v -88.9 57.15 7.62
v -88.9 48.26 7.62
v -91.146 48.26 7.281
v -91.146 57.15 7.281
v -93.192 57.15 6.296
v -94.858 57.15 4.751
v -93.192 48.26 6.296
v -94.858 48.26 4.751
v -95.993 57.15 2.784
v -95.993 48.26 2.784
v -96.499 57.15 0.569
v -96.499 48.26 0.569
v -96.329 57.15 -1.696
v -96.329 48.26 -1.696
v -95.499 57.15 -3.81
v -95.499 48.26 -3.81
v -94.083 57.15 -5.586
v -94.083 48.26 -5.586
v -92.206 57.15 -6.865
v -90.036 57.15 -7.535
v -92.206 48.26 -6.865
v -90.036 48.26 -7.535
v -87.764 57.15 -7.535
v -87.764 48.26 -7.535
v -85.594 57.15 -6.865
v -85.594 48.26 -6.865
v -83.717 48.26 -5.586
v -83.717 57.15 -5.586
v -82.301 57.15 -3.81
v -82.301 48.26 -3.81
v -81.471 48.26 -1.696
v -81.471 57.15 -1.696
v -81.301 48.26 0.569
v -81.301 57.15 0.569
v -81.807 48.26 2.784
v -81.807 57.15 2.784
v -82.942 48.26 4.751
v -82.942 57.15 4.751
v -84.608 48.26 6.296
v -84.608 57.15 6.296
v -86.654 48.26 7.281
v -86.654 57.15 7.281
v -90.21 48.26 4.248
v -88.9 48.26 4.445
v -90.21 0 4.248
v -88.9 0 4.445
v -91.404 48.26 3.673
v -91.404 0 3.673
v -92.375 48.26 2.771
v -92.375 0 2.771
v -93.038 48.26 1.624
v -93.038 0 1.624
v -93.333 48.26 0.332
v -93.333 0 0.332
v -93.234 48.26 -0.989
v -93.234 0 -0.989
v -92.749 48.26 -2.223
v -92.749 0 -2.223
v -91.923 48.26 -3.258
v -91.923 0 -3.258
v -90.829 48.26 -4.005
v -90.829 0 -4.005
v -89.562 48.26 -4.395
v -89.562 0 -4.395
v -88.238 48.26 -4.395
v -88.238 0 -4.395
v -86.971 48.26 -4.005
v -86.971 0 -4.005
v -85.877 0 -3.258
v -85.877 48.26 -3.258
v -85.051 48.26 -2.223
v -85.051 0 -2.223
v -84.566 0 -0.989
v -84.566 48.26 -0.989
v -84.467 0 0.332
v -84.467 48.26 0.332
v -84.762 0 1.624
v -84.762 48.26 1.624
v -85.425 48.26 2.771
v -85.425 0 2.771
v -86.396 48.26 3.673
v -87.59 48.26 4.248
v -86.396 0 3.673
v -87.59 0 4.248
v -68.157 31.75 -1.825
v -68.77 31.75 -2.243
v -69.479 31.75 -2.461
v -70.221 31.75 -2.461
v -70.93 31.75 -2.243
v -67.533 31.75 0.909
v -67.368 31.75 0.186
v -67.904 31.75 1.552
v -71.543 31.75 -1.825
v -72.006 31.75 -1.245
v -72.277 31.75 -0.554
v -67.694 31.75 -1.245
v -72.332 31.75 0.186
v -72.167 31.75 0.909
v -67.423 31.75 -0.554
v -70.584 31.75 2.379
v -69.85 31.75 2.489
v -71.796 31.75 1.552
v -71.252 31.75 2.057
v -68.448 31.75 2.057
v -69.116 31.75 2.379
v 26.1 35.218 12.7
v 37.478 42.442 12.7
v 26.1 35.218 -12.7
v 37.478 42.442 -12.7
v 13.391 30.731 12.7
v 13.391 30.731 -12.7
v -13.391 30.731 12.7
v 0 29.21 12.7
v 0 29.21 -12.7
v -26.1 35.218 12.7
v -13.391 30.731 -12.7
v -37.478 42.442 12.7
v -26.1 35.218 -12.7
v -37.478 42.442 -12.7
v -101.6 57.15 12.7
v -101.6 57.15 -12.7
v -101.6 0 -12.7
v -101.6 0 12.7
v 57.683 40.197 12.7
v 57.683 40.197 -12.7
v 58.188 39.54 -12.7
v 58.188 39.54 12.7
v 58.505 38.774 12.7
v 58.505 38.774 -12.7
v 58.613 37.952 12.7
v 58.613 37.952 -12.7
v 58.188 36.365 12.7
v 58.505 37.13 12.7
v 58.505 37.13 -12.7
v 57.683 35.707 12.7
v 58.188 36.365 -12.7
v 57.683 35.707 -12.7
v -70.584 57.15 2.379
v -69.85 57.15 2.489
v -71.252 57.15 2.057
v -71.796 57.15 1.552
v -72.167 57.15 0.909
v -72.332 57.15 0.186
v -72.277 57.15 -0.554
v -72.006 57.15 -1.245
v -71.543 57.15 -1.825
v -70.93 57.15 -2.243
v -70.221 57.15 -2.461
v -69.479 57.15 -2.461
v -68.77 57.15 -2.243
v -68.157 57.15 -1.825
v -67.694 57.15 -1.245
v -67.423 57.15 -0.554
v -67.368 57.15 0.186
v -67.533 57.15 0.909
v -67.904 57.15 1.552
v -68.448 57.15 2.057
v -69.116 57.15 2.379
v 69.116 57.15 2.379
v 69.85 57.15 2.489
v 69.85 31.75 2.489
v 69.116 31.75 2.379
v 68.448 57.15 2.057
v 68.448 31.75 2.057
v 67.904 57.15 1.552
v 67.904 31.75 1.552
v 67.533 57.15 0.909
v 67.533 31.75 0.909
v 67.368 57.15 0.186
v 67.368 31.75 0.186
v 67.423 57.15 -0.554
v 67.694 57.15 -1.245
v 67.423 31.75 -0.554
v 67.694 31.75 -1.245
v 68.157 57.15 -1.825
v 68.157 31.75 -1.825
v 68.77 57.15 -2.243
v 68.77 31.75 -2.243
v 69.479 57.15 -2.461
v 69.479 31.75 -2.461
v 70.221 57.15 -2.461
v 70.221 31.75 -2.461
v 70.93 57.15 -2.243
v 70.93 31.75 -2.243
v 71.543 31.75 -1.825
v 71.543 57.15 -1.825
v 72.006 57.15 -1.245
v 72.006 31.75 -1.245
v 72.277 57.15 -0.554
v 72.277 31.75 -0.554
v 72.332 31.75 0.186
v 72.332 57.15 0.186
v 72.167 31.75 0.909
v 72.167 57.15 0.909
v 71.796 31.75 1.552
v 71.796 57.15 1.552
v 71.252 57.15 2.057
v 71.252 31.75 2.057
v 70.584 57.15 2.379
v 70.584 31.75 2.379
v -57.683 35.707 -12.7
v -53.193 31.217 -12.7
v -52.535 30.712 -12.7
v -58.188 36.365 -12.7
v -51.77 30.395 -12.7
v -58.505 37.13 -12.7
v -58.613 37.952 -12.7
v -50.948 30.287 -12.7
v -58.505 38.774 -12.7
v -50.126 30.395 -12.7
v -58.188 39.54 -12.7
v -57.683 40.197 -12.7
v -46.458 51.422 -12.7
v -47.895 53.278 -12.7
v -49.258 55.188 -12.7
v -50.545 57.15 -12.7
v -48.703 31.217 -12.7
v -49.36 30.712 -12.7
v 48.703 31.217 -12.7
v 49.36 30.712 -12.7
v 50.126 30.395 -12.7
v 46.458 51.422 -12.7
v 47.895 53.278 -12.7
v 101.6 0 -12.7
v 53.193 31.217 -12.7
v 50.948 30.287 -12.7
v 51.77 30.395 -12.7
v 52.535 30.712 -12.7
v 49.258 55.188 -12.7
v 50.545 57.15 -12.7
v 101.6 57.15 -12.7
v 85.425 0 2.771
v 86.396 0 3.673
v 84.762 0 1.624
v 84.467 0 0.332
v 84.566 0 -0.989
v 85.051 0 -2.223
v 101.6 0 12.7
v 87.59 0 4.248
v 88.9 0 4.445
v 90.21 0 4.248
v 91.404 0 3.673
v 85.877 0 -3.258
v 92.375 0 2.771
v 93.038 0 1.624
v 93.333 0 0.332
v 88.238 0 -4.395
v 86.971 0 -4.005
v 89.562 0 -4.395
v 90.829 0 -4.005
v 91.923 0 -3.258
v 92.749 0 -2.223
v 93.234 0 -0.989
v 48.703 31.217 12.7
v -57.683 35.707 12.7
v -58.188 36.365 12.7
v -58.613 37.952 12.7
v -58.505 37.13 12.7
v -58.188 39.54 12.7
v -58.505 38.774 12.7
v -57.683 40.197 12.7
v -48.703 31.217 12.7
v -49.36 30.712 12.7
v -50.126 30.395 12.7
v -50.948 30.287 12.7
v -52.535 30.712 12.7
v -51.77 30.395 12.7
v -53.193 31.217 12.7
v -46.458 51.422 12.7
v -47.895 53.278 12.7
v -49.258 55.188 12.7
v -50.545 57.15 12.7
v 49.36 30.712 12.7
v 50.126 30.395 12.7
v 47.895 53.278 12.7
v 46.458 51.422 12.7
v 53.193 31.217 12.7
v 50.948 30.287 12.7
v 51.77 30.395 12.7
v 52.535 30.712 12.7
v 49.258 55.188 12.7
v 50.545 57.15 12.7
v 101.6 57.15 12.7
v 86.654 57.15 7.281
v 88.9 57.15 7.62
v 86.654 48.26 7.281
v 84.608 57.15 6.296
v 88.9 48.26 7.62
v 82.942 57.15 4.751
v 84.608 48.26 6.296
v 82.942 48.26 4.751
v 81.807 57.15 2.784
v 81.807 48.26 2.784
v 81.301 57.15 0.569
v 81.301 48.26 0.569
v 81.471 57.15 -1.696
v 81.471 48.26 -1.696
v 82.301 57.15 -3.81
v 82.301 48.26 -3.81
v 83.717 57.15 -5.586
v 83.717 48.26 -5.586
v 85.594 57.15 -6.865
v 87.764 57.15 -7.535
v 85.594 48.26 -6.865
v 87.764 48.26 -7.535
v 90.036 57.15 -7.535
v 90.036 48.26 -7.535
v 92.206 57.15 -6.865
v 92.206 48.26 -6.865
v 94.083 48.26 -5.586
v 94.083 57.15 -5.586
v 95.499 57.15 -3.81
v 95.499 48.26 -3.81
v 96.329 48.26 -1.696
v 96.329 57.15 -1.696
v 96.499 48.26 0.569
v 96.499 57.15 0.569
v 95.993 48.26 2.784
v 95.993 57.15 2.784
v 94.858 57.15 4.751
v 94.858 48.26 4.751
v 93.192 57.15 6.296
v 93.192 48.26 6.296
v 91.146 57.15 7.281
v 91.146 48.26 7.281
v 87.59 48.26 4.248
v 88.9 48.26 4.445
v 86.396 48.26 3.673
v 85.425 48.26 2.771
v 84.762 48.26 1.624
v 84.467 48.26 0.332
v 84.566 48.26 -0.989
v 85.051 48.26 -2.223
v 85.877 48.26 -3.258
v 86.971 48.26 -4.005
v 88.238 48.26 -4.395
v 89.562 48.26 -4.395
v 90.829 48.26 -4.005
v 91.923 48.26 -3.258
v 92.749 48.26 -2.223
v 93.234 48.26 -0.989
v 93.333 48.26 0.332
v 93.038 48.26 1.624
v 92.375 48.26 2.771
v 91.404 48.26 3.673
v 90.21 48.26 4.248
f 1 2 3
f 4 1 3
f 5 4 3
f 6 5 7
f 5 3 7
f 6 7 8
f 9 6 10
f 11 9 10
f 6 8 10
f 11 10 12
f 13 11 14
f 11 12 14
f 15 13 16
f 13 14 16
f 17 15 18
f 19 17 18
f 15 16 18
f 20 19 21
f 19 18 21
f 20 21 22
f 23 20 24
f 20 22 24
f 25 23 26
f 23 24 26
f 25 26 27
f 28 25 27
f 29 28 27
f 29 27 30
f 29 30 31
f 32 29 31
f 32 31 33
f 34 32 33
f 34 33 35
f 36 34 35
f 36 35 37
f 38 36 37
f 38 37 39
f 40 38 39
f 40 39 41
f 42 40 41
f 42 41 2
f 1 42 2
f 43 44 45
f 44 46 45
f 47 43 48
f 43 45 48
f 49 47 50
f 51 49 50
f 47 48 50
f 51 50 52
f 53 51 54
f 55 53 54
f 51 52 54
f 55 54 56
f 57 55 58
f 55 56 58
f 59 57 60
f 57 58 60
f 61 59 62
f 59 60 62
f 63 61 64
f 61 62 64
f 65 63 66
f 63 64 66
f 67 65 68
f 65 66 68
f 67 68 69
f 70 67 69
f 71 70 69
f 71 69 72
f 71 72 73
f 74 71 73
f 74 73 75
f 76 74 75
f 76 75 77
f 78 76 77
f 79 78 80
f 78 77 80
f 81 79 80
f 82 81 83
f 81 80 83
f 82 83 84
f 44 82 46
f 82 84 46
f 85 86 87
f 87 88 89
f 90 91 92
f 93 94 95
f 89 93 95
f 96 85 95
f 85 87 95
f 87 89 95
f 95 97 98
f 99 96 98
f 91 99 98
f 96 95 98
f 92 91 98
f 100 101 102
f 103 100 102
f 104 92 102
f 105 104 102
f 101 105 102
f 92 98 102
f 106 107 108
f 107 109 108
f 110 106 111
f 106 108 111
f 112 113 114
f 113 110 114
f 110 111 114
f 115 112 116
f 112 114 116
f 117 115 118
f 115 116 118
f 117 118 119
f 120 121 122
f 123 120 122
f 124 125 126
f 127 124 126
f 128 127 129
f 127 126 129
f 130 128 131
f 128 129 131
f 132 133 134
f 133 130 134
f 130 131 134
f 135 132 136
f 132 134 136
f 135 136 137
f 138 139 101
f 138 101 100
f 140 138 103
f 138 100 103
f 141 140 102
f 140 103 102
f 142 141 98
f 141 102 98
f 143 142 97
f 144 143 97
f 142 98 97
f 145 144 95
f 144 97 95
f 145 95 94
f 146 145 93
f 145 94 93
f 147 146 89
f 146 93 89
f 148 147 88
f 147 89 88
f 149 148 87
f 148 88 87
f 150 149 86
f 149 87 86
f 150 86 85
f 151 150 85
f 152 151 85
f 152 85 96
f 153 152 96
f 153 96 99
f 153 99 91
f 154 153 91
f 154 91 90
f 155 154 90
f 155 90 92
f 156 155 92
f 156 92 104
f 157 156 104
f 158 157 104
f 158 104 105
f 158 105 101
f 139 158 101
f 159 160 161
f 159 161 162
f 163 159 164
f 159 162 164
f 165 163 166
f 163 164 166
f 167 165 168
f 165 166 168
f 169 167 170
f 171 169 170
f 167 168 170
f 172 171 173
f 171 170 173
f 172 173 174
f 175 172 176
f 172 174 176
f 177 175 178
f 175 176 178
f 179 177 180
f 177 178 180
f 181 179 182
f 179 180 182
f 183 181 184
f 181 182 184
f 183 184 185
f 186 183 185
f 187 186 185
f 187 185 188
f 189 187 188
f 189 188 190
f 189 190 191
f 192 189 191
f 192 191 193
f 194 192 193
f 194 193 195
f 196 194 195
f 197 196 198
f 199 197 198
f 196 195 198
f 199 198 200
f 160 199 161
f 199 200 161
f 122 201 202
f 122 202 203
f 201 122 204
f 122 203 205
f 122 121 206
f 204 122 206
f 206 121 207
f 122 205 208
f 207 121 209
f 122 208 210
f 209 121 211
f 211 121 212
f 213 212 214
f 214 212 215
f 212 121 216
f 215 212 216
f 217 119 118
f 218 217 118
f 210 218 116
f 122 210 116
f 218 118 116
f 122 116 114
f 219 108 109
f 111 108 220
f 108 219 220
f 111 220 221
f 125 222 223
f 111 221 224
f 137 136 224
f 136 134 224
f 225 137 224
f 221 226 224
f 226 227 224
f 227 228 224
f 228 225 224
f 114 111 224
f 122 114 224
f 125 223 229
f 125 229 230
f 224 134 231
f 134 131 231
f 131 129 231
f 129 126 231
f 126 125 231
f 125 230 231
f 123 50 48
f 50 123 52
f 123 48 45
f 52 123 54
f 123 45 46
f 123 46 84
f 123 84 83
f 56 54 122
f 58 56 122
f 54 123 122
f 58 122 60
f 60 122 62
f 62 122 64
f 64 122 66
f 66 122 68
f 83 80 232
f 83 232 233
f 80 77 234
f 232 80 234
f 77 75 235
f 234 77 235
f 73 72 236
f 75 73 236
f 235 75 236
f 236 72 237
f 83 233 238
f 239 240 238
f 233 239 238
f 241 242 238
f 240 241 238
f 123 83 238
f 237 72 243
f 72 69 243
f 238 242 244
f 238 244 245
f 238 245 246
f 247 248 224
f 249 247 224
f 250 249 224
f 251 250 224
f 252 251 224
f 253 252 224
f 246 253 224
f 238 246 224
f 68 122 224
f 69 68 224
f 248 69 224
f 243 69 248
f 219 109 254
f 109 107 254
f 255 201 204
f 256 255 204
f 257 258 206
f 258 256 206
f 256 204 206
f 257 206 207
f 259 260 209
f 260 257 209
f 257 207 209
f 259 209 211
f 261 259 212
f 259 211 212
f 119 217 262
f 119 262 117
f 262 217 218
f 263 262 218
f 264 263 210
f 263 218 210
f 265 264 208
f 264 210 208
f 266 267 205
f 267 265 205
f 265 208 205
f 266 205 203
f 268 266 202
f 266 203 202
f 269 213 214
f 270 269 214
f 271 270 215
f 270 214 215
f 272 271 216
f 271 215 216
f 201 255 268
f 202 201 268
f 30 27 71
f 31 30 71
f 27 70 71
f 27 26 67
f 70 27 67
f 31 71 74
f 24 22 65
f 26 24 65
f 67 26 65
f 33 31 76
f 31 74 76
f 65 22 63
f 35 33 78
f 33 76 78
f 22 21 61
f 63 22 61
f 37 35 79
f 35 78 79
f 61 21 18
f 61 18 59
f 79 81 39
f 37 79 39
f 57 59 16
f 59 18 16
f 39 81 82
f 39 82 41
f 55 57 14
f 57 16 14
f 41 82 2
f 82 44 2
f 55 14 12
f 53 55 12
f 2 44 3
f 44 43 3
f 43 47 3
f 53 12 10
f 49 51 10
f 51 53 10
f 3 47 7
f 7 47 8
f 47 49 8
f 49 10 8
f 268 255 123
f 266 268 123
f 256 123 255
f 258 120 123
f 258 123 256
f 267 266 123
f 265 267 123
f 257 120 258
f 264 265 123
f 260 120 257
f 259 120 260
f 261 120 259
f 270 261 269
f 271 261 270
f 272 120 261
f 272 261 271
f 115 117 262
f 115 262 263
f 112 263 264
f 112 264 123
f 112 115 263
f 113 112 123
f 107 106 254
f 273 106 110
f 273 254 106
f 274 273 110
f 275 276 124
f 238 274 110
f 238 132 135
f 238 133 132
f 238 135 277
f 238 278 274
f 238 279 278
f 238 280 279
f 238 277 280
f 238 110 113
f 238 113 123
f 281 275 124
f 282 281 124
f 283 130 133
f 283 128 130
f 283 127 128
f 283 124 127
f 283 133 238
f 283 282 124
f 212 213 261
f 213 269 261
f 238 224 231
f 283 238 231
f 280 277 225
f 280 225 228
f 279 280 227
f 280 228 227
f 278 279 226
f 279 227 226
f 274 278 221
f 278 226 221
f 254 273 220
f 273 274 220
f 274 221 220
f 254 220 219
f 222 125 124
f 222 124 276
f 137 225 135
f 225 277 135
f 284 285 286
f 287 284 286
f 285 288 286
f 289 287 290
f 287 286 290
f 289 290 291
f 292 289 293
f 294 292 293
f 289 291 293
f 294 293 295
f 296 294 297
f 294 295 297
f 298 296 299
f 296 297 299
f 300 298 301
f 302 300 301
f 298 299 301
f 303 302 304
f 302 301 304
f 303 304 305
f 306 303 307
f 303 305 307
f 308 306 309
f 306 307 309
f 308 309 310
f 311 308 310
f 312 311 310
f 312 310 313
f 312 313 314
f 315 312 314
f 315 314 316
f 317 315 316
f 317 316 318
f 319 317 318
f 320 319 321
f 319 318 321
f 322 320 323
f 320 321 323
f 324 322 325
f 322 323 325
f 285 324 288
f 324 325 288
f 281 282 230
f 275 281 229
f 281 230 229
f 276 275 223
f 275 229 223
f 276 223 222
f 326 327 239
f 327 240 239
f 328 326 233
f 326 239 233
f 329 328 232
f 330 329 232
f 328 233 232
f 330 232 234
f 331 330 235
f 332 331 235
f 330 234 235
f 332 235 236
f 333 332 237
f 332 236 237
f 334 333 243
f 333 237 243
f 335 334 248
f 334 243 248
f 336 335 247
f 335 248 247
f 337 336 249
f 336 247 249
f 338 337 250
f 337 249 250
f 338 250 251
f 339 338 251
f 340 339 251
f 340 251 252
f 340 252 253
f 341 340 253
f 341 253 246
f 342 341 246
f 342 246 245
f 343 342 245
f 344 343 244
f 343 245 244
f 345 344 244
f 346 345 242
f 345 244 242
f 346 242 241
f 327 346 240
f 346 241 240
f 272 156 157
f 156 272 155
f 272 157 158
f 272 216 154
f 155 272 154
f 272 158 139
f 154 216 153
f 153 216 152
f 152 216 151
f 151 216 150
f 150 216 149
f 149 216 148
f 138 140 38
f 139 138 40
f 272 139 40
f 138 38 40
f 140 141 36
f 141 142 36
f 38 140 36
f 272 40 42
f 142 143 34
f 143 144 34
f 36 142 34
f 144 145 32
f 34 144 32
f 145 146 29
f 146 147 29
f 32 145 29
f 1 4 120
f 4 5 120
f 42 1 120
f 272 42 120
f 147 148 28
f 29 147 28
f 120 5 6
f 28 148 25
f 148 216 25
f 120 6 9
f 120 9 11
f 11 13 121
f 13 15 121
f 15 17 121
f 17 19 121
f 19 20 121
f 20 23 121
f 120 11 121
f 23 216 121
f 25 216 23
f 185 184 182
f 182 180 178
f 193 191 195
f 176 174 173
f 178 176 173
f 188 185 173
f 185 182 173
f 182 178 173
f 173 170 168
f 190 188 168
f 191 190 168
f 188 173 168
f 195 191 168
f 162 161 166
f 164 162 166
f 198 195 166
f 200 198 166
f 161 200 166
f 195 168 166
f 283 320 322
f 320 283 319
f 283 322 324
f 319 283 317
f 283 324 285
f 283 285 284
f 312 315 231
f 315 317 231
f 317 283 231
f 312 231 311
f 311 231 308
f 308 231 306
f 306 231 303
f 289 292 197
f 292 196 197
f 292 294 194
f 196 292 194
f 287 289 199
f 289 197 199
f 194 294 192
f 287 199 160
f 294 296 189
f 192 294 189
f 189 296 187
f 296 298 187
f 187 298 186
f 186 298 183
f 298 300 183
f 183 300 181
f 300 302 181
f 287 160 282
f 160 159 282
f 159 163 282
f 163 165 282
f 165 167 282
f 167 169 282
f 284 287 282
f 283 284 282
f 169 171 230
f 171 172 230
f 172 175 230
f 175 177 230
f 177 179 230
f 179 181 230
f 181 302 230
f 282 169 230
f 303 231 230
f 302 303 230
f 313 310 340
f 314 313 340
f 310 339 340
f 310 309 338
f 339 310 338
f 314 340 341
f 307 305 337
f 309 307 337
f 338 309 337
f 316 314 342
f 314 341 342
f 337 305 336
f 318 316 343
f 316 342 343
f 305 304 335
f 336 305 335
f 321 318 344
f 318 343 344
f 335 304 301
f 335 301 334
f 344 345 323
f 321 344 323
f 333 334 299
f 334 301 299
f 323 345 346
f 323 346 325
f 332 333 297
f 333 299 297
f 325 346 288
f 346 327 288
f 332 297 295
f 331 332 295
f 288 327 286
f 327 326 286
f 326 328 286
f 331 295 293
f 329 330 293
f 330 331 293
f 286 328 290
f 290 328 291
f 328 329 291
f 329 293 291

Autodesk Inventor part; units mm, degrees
ref_plane "YZ Plane" through (0, 0, 0) normal (1, 0, 0) x (0, 1, 0)
ref_plane "XZ Plane" through (0, 0, 0) normal (0, 1, 0) x (-1, 0, 0)
ref_plane "XY Plane" through (0, 0, 0) normal (0, 0, 1) x (1, 0, 0)
sketch "Sketch1" plane through (0, 0, 0) normal (0, 0, 1) x (1, 0, 0)
  arc A0 (-50.5454, 57.15) -> (50.5454, 57.15) centre (0, 88.9) ccw
  line L0 (-50.5454, 57.15) -> (-101.6, 57.15)
  line L1 (-101.6, 57.15) -> (-101.6, 0)
  line L2 (-101.6, 0) -> (101.6, 0)
  line L3 (101.6, 0) -> (101.6, 57.15)
  line L4 (101.6, 57.15) -> (50.5454, 57.15)
  line L5 (-142.24, 0) -> (142.24, 0) projected
  line L6 (0, 57.6383) -> (0, -27.9062) construction
  line L7 (0, -51.2675) -> (0, 112.2612) projected
  point P0 (0, 0)
  dimension "d32" = 57.15
  dimension "d33" = 59.69
  dimension "d63" = 88.9
  dimension "d64" = 203.2
  dimension "d65" = 101.6
extrude "Extrusion1" add sketch "Sketch1" along normal mid plane 25.4
sketch "Sketch2" plane through (-101.6, 57.15, 12.7) normal (0, 1, 0) x (1, 0, 0)
  line L0 (51.0546, 25.4) -> (51.0546, 0) projected
  line L1 (51.0546, 0) -> (0, 0) projected
  line L2 (152.1454, 25.4) -> (152.1454, 0) projected
  line L3 (203.2, 0) -> (152.1454, 0) projected
  line L4 (203.2, 25.4) -> (203.2, 0) projected
  line L5 (0, 0) -> (0, 25.4) projected
  point P0 (101.6, 12.7)
  point P1 (31.75, 12.7)
  point P2 (171.45, 12.7)
  dimension "d16" = 12.7
  dimension "d18" = 12.7
  dimension "d19" = 31.75
  dimension "d20" = 31.75
hole "Hole1" at (-69.85, 57.15, 0) at (69.85, 57.15, 0) direction (0, -1, 0) diameter 4.9784 depth 25.4 thread size "1/4-20 UNC" class "2B" standard "ANSI Unified Screw Threads"
sketch "Sketch4" plane through (0, 0, 12.7) normal (0, 0, 1) x (1, 0, 0)
  line L0 (-46.4578, 51.4224) -> (-59.9282, 37.9521)
  line L1 (-59.9282, 37.9521) -> (-50.9479, 28.9718)
  line L2 (-50.9479, 28.9718) -> (-37.4776, 42.4422)
  line L3 (-37.4776, 42.4422) -> (-46.4578, 51.4224)
  line L4 (37.4776, 42.4422) -> (50.9479, 28.9718)
  line L5 (50.9479, 28.9718) -> (59.9282, 37.9521)
  line L6 (59.9282, 37.9521) -> (46.4578, 51.4224)
  line L7 (46.4578, 51.4224) -> (37.4776, 42.4422)
  line L8 (0, 53.9269) -> (0, 0) construction
  line L9 (-101.6, 0) -> (101.6, 0) projected
  arc A0 (-50.5454, 57.15) -> (50.5454, 57.15) centre (0, 88.9) ccw projected
  line L10 (34.6064, 54.2936) -> (52.2131, 36.6869) construction
  line L11 (-58.7882, 30.1118) -> (-24.955, 63.945) construction
  point P0 (46.4578, 51.4224)
  point P1 (-46.4578, 51.4224)
  dimension "d35" = 90
  dimension "d36" = 45
  dimension "d38" = 12.7
  dimension "d39" = 12.7
  dimension "d42" = 6.35
  dimension "d43" = 6.35
  dimension "d46" = 19.05
  dimension "d51" = 19.05
extrude "Extrusion2" cut sketch "Sketch4" against normal through all contours A0 L2 L1 L0 | A0 L6 L5 L4
sketch "Sketch3" plane through (50.5454, 57.15, 12.7) normal (0, 1, 0) x (1, 0, 0)
  line L0 (51.0546, 25.4) -> (51.0546, 0) projected
  line L1 (51.0546, 0) -> (0, 0) projected
  line L2 (-152.1454, 0) -> (-152.1454, 25.4) projected
  line L3 (-101.0907, 0) -> (-152.1454, 0) projected
  line L4 (-152.1454, 12.7) -> (51.0546, 12.7) construction
  point P0 (-50.5454, 12.7)
  point P1 (38.3546, 12.7)
  point P2 (-139.4454, 12.7)
  dimension "d28" = 12.7
  dimension "d30" = 12.7
hole "Hole2" at (88.9, 57.15, 0) at (-88.9, 57.15, 0) direction (0, -1, 0) diameter 8.89 end through all counterbore diameter 15.24 counterbore depth 8.89 clearance for "Socket Head Cap Screw" size "M8" standard "Ansi Metric M Profile"
fillet "Fillet2" radius 3.175 4 edges at (-59.9282, 37.9521, 0) (-50.9479, 28.9718, 0) (50.9479, 28.9718, 0) (59.9282, 37.9521, 0)
equation "\"d36\" = 0.5 * d35"
equation "\"d42\" = 0.5 * d39"
equation "\"d43\" = 0.5 * d38"
properties part number "ODSY-0007-003" material "Aluminum 6061"
